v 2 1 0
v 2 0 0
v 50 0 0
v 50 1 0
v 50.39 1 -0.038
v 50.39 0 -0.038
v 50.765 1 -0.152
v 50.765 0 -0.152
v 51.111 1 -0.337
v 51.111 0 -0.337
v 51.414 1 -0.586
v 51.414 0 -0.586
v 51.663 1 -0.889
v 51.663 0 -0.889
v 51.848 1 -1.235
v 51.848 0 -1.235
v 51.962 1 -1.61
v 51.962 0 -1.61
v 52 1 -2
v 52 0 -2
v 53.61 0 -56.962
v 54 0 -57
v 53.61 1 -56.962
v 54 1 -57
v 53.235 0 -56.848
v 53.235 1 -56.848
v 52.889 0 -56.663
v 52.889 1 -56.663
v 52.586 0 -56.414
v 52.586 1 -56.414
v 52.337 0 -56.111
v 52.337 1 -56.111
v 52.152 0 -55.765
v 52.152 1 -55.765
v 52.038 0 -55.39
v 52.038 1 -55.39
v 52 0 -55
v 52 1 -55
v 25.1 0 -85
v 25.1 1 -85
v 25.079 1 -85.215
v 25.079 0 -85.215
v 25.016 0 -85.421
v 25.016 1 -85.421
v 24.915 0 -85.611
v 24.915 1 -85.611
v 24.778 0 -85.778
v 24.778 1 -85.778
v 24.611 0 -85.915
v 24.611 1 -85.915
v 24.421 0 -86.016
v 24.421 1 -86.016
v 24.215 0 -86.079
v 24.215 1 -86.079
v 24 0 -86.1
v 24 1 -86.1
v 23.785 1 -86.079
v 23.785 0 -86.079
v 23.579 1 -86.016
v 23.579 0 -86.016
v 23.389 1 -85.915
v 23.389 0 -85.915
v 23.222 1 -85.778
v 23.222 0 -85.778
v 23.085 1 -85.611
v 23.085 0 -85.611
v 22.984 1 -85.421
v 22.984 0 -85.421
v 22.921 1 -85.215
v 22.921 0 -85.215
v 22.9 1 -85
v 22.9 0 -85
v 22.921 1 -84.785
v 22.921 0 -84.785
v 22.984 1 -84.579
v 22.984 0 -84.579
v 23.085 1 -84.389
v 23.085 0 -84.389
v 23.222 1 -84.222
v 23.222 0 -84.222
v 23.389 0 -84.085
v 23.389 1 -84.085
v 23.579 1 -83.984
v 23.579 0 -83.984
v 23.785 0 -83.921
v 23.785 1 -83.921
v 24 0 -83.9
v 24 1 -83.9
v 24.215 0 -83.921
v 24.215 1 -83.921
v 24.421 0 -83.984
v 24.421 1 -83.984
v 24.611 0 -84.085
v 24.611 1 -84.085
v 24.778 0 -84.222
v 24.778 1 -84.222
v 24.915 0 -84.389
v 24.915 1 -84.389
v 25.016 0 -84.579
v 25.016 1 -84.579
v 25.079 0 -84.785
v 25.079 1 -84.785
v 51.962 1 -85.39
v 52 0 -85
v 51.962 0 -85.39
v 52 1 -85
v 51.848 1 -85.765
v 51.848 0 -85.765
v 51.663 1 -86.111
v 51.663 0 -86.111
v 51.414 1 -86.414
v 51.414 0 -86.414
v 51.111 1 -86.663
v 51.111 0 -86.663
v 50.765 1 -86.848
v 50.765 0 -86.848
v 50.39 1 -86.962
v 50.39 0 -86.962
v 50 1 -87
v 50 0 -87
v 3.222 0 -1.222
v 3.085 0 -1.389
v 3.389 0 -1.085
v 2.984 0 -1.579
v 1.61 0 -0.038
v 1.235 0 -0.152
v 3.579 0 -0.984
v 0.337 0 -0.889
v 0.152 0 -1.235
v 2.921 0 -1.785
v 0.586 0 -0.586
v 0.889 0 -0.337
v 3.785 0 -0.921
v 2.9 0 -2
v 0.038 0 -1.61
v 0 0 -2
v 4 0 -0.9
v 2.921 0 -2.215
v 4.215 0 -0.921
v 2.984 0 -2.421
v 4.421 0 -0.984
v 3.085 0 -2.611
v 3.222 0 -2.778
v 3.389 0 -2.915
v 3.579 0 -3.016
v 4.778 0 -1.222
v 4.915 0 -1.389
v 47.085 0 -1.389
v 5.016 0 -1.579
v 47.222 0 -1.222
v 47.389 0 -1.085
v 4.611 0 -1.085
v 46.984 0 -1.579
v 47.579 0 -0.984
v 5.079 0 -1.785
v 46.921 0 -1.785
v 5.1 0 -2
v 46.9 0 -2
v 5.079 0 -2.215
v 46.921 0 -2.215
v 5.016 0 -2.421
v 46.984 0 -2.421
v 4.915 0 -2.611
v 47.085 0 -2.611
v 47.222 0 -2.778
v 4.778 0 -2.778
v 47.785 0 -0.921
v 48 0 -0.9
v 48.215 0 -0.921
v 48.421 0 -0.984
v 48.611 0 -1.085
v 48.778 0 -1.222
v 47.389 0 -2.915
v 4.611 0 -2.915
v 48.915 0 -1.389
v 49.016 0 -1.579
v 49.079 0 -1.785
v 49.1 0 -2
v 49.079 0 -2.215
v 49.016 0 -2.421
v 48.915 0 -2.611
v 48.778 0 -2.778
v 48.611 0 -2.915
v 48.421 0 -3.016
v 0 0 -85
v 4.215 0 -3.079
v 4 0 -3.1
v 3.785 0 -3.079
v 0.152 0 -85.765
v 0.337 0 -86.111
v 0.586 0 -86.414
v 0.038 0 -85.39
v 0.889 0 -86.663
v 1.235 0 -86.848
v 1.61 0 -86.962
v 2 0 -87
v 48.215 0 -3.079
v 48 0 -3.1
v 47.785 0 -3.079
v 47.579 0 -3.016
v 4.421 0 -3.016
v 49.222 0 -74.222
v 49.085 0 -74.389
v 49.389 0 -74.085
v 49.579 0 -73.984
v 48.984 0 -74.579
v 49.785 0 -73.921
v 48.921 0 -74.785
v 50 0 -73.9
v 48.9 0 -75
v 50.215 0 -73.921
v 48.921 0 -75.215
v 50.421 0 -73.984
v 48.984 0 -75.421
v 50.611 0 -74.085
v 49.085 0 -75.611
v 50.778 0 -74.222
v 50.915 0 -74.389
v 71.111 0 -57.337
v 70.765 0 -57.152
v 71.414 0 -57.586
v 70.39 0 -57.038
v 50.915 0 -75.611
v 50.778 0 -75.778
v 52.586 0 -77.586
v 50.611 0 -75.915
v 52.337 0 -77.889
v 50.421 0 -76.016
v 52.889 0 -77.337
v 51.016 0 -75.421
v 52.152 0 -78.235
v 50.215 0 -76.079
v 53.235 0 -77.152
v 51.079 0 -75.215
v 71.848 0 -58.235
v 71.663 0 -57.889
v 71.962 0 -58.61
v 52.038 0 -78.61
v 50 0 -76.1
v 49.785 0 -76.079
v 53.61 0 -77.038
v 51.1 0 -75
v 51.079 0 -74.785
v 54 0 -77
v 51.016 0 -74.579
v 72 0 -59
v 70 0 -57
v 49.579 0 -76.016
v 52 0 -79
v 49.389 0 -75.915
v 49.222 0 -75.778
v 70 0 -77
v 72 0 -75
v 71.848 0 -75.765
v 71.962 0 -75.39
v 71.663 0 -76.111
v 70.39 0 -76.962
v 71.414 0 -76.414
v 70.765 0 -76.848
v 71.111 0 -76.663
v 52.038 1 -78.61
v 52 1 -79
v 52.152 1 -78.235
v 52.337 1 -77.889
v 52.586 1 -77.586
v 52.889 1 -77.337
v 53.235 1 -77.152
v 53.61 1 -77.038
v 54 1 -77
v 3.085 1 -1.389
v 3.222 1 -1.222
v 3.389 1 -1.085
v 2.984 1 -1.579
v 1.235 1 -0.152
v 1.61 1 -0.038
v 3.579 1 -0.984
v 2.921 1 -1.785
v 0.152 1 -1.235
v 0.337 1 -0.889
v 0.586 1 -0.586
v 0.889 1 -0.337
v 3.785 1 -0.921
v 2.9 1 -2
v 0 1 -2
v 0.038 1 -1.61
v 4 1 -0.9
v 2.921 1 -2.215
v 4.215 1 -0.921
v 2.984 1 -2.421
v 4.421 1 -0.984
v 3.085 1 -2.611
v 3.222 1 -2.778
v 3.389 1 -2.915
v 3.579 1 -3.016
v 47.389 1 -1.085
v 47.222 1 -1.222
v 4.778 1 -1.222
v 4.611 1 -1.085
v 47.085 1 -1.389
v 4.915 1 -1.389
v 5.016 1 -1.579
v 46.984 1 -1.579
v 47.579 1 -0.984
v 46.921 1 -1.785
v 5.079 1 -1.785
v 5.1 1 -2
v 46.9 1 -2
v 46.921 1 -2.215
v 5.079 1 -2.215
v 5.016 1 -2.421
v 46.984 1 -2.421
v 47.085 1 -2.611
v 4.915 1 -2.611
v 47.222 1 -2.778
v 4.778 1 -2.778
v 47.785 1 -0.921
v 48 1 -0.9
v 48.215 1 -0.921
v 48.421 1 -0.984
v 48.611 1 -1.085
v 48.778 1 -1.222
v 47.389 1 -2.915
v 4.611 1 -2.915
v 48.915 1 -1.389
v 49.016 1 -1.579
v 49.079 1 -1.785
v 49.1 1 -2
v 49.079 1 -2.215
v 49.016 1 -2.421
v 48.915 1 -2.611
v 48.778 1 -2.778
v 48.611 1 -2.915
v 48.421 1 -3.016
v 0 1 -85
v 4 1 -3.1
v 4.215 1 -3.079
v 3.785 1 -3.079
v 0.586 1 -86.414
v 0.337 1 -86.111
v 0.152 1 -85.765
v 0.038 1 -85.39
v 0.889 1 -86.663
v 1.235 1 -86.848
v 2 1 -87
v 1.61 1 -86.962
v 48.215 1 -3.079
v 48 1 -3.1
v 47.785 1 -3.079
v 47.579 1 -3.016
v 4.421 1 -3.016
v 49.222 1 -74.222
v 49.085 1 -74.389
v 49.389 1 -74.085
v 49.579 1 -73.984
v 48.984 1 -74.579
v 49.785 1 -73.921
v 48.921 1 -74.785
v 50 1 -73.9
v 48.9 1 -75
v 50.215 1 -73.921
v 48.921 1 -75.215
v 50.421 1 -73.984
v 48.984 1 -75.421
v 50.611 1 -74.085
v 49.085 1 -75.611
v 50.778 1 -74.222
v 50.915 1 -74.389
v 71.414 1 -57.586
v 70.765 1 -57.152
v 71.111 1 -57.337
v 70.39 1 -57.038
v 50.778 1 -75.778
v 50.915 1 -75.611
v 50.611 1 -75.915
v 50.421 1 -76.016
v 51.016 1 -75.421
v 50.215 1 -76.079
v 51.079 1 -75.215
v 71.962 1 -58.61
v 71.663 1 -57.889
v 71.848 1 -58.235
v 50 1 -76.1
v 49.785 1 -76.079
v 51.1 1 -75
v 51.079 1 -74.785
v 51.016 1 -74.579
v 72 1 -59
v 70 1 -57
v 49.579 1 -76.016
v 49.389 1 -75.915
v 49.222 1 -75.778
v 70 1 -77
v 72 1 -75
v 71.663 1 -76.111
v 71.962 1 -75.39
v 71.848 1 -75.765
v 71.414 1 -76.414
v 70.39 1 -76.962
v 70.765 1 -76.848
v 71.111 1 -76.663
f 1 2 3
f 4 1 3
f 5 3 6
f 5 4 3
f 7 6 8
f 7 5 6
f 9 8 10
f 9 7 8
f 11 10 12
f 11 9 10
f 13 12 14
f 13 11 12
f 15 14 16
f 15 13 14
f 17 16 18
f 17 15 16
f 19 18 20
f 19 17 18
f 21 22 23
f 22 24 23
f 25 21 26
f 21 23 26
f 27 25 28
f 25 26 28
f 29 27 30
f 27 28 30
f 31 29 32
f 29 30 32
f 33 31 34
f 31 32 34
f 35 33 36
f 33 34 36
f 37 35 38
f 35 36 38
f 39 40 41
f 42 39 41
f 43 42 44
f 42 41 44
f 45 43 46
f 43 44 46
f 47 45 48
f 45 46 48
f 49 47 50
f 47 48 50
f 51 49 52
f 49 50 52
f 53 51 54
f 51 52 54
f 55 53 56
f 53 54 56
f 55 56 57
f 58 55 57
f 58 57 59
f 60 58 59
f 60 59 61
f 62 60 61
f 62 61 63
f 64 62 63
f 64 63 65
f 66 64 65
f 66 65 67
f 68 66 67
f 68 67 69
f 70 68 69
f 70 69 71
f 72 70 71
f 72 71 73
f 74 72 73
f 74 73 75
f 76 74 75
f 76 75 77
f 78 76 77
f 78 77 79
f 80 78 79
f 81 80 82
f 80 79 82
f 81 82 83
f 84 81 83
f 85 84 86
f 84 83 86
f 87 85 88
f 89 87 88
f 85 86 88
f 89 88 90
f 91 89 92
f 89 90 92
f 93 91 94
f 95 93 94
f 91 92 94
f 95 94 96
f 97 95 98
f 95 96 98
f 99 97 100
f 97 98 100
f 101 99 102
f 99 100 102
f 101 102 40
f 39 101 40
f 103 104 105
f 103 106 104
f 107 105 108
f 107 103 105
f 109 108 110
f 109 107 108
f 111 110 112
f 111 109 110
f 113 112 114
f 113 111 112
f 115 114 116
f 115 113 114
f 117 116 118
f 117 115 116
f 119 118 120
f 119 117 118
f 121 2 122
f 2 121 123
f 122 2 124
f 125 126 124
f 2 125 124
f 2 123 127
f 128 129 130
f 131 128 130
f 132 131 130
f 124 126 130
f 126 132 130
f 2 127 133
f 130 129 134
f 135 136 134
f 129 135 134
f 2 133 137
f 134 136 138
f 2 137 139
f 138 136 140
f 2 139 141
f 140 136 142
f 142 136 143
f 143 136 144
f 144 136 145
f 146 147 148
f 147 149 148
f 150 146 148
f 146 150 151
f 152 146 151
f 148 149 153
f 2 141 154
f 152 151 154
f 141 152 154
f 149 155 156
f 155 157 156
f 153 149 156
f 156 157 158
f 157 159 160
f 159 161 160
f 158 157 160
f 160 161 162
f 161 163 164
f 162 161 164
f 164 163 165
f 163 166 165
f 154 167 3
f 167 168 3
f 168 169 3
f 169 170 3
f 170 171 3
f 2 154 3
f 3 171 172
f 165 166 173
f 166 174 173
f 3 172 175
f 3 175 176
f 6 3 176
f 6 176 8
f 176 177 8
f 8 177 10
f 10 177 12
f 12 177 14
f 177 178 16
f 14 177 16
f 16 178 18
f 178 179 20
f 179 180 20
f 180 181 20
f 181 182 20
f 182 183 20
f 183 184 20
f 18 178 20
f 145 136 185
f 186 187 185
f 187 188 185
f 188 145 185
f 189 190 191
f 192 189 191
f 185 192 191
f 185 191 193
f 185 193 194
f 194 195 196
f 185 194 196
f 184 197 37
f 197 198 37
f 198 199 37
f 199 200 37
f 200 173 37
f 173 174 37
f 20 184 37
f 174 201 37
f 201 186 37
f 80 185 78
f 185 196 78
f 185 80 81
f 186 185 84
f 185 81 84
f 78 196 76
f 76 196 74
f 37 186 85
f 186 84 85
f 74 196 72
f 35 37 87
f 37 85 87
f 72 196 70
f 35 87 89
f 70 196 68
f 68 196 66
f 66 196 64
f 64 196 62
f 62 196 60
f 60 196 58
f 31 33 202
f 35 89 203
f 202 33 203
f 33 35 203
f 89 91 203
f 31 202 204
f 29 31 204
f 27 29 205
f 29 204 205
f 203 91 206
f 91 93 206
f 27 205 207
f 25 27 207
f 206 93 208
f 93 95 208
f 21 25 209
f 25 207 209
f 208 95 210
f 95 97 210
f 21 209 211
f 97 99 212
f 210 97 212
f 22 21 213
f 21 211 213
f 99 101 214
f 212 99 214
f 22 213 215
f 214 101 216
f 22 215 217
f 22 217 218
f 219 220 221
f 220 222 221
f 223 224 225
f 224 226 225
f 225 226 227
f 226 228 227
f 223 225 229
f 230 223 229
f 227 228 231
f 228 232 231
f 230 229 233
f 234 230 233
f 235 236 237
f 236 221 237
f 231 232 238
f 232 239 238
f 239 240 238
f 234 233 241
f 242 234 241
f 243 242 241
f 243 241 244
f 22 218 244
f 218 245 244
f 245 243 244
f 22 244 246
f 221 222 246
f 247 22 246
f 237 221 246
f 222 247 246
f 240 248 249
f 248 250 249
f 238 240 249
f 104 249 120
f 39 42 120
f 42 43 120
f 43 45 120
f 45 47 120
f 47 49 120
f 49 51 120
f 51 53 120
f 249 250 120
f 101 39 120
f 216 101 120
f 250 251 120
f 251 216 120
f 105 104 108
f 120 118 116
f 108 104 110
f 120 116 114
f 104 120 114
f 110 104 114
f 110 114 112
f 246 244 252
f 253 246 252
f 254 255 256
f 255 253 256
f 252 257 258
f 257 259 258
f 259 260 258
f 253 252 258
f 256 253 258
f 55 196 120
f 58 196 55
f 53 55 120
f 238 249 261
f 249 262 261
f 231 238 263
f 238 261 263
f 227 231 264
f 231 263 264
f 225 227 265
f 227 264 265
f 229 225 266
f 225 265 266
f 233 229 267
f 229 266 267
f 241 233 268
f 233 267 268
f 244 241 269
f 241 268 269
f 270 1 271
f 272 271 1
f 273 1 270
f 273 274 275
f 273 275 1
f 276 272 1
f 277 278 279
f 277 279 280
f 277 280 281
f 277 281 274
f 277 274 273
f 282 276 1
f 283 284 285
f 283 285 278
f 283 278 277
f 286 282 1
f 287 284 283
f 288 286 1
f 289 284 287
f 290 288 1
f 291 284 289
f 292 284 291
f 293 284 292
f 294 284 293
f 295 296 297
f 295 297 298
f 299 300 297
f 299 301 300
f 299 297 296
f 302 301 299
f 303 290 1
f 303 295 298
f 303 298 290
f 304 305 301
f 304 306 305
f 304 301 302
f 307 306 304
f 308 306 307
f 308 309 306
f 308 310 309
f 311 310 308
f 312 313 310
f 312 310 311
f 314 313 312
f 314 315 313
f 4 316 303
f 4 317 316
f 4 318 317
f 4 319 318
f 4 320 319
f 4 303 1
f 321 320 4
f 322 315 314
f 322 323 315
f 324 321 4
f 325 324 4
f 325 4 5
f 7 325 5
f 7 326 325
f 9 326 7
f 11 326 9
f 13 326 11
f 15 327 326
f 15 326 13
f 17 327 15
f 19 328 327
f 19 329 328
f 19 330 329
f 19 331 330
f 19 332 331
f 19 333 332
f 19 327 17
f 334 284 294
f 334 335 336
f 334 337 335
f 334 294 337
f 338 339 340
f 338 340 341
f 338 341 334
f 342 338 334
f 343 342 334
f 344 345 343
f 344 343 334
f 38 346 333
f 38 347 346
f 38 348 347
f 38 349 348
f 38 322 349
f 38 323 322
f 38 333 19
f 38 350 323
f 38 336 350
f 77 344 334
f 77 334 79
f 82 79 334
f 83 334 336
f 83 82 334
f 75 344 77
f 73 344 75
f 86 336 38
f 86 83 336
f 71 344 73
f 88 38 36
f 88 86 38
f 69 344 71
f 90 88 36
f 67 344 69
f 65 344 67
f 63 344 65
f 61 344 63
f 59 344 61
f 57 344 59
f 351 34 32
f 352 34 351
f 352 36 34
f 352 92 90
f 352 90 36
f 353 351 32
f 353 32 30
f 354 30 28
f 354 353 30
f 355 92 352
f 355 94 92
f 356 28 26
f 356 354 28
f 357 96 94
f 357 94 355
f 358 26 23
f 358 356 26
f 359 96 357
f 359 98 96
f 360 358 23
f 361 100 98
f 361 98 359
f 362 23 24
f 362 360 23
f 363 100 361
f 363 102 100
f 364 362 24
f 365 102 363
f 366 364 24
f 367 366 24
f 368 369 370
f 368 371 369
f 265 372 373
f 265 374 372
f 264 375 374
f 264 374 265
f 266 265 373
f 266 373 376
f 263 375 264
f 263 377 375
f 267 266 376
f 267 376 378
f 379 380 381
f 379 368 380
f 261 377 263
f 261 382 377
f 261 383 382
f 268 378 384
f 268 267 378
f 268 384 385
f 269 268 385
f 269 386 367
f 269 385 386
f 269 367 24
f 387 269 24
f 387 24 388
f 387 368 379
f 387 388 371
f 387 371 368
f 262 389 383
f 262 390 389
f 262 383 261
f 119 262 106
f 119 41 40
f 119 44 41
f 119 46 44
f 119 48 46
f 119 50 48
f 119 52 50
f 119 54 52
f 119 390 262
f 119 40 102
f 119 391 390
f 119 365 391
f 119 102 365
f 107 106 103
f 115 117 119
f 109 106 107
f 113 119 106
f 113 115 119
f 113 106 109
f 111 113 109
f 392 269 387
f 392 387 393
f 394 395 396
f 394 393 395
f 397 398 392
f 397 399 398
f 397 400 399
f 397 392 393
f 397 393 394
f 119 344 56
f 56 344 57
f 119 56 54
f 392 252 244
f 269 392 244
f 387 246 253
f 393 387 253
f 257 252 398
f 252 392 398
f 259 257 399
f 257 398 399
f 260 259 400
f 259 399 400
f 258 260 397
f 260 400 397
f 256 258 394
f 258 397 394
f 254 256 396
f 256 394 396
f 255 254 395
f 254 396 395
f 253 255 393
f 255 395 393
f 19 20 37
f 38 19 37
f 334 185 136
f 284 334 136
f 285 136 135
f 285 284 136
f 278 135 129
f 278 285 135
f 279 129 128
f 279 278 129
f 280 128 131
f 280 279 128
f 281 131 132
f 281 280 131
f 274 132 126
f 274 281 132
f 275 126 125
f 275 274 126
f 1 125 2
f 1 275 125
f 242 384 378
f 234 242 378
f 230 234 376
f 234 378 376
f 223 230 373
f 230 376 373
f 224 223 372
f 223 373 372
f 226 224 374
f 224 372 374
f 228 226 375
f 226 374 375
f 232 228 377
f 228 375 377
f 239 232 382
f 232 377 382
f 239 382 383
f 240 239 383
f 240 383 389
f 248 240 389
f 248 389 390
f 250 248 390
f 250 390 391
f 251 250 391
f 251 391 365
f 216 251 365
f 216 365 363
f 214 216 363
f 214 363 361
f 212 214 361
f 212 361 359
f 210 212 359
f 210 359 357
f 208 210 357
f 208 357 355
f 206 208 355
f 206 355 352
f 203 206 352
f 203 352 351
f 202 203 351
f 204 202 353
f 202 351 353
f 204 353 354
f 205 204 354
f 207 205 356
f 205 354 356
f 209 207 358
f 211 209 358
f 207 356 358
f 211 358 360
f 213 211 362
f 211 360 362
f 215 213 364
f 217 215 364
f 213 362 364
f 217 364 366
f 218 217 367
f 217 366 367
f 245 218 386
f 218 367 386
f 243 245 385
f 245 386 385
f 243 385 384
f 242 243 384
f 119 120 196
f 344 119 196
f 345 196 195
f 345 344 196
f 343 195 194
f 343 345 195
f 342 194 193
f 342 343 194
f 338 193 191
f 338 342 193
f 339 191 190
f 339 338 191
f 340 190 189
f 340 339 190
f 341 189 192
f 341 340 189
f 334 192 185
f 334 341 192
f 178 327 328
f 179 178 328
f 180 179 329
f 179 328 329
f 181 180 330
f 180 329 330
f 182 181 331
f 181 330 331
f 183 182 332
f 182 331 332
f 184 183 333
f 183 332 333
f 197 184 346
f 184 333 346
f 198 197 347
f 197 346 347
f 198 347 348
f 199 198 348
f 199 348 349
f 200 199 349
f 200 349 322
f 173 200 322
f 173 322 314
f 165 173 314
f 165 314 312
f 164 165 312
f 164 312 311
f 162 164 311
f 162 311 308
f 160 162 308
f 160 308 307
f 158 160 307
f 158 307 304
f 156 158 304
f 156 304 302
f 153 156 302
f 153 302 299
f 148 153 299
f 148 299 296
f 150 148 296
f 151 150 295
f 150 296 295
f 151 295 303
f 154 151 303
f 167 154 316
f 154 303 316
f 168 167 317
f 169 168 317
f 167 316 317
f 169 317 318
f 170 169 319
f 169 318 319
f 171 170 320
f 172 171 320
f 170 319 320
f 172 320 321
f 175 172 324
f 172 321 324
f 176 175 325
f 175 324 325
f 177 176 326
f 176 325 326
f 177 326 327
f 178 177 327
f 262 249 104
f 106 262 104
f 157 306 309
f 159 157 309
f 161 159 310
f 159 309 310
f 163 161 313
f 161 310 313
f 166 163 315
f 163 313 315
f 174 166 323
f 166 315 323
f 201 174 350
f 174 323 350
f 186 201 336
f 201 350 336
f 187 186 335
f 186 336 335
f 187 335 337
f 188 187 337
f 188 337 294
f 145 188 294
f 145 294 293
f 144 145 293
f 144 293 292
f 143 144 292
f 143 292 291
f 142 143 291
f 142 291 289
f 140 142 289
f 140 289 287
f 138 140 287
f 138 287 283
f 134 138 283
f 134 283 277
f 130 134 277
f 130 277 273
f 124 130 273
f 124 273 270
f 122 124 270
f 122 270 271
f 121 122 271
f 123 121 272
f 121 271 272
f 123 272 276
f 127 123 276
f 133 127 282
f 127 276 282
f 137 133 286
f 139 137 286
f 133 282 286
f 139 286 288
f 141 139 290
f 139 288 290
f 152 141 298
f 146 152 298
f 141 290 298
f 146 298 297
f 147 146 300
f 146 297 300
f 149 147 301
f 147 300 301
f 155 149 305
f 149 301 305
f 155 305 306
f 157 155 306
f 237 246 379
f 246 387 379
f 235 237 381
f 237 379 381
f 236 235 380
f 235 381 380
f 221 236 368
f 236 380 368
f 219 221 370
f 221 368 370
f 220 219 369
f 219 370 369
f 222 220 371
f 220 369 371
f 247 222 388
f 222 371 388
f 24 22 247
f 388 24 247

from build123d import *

# Parameters (mm, degrees)
BOSS_EXTRUDE1_DEPTH = 1
SKETCH2_R           = 1.1
CUT_EXTRUDE1_DEPTH  = 4
FILLET1_R           = 2


with BuildPart() as part:
    # Sketch1 → Boss-Extrude1 (new body)
    with BuildSketch(Plane(origin=(0, 0, 0), x_dir=(1, 0, 0), z_dir=(0, 1, 0))):
        Polygon((52, 77), (52, 87), (0, 87), (0, 0), (52, 0), (52, 57), (72, 57), (72, 77), align=None)
    extrude(amount=BOSS_EXTRUDE1_DEPTH)

    # Sketch2 → Cut-Extrude1 (cut)
    with BuildSketch(Plane(origin=(0, 1, 0), x_dir=(1, 0, 0), z_dir=(0, 1, 0))):
        with Locations((4, 2)):
            Circle(SKETCH2_R)
        with Locations((48, 2)):
            Circle(SKETCH2_R)
        with Locations((24, 85)):
            Circle(SKETCH2_R)
        with Locations((50, 75)):
            Circle(SKETCH2_R)
    extrude(amount=-CUT_EXTRUDE1_DEPTH, mode=Mode.SUBTRACT)

    # Fillet1
    fillet1_edges = [part.edges().sort_by_distance(p)[0] for p in [
        (0, 0.5, -87),
        (52, 0.5, -87),
        (52, 0.5, -77),
        (72, 0.5, -77),
        (72, 0.5, -57),
        (52, 0.5, -57),
        (52, 0.5, 0),
        (0, 0.5, 0),
    ]]
    fillet(fillet1_edges, radius=FILLET1_R)


solid = part.part
